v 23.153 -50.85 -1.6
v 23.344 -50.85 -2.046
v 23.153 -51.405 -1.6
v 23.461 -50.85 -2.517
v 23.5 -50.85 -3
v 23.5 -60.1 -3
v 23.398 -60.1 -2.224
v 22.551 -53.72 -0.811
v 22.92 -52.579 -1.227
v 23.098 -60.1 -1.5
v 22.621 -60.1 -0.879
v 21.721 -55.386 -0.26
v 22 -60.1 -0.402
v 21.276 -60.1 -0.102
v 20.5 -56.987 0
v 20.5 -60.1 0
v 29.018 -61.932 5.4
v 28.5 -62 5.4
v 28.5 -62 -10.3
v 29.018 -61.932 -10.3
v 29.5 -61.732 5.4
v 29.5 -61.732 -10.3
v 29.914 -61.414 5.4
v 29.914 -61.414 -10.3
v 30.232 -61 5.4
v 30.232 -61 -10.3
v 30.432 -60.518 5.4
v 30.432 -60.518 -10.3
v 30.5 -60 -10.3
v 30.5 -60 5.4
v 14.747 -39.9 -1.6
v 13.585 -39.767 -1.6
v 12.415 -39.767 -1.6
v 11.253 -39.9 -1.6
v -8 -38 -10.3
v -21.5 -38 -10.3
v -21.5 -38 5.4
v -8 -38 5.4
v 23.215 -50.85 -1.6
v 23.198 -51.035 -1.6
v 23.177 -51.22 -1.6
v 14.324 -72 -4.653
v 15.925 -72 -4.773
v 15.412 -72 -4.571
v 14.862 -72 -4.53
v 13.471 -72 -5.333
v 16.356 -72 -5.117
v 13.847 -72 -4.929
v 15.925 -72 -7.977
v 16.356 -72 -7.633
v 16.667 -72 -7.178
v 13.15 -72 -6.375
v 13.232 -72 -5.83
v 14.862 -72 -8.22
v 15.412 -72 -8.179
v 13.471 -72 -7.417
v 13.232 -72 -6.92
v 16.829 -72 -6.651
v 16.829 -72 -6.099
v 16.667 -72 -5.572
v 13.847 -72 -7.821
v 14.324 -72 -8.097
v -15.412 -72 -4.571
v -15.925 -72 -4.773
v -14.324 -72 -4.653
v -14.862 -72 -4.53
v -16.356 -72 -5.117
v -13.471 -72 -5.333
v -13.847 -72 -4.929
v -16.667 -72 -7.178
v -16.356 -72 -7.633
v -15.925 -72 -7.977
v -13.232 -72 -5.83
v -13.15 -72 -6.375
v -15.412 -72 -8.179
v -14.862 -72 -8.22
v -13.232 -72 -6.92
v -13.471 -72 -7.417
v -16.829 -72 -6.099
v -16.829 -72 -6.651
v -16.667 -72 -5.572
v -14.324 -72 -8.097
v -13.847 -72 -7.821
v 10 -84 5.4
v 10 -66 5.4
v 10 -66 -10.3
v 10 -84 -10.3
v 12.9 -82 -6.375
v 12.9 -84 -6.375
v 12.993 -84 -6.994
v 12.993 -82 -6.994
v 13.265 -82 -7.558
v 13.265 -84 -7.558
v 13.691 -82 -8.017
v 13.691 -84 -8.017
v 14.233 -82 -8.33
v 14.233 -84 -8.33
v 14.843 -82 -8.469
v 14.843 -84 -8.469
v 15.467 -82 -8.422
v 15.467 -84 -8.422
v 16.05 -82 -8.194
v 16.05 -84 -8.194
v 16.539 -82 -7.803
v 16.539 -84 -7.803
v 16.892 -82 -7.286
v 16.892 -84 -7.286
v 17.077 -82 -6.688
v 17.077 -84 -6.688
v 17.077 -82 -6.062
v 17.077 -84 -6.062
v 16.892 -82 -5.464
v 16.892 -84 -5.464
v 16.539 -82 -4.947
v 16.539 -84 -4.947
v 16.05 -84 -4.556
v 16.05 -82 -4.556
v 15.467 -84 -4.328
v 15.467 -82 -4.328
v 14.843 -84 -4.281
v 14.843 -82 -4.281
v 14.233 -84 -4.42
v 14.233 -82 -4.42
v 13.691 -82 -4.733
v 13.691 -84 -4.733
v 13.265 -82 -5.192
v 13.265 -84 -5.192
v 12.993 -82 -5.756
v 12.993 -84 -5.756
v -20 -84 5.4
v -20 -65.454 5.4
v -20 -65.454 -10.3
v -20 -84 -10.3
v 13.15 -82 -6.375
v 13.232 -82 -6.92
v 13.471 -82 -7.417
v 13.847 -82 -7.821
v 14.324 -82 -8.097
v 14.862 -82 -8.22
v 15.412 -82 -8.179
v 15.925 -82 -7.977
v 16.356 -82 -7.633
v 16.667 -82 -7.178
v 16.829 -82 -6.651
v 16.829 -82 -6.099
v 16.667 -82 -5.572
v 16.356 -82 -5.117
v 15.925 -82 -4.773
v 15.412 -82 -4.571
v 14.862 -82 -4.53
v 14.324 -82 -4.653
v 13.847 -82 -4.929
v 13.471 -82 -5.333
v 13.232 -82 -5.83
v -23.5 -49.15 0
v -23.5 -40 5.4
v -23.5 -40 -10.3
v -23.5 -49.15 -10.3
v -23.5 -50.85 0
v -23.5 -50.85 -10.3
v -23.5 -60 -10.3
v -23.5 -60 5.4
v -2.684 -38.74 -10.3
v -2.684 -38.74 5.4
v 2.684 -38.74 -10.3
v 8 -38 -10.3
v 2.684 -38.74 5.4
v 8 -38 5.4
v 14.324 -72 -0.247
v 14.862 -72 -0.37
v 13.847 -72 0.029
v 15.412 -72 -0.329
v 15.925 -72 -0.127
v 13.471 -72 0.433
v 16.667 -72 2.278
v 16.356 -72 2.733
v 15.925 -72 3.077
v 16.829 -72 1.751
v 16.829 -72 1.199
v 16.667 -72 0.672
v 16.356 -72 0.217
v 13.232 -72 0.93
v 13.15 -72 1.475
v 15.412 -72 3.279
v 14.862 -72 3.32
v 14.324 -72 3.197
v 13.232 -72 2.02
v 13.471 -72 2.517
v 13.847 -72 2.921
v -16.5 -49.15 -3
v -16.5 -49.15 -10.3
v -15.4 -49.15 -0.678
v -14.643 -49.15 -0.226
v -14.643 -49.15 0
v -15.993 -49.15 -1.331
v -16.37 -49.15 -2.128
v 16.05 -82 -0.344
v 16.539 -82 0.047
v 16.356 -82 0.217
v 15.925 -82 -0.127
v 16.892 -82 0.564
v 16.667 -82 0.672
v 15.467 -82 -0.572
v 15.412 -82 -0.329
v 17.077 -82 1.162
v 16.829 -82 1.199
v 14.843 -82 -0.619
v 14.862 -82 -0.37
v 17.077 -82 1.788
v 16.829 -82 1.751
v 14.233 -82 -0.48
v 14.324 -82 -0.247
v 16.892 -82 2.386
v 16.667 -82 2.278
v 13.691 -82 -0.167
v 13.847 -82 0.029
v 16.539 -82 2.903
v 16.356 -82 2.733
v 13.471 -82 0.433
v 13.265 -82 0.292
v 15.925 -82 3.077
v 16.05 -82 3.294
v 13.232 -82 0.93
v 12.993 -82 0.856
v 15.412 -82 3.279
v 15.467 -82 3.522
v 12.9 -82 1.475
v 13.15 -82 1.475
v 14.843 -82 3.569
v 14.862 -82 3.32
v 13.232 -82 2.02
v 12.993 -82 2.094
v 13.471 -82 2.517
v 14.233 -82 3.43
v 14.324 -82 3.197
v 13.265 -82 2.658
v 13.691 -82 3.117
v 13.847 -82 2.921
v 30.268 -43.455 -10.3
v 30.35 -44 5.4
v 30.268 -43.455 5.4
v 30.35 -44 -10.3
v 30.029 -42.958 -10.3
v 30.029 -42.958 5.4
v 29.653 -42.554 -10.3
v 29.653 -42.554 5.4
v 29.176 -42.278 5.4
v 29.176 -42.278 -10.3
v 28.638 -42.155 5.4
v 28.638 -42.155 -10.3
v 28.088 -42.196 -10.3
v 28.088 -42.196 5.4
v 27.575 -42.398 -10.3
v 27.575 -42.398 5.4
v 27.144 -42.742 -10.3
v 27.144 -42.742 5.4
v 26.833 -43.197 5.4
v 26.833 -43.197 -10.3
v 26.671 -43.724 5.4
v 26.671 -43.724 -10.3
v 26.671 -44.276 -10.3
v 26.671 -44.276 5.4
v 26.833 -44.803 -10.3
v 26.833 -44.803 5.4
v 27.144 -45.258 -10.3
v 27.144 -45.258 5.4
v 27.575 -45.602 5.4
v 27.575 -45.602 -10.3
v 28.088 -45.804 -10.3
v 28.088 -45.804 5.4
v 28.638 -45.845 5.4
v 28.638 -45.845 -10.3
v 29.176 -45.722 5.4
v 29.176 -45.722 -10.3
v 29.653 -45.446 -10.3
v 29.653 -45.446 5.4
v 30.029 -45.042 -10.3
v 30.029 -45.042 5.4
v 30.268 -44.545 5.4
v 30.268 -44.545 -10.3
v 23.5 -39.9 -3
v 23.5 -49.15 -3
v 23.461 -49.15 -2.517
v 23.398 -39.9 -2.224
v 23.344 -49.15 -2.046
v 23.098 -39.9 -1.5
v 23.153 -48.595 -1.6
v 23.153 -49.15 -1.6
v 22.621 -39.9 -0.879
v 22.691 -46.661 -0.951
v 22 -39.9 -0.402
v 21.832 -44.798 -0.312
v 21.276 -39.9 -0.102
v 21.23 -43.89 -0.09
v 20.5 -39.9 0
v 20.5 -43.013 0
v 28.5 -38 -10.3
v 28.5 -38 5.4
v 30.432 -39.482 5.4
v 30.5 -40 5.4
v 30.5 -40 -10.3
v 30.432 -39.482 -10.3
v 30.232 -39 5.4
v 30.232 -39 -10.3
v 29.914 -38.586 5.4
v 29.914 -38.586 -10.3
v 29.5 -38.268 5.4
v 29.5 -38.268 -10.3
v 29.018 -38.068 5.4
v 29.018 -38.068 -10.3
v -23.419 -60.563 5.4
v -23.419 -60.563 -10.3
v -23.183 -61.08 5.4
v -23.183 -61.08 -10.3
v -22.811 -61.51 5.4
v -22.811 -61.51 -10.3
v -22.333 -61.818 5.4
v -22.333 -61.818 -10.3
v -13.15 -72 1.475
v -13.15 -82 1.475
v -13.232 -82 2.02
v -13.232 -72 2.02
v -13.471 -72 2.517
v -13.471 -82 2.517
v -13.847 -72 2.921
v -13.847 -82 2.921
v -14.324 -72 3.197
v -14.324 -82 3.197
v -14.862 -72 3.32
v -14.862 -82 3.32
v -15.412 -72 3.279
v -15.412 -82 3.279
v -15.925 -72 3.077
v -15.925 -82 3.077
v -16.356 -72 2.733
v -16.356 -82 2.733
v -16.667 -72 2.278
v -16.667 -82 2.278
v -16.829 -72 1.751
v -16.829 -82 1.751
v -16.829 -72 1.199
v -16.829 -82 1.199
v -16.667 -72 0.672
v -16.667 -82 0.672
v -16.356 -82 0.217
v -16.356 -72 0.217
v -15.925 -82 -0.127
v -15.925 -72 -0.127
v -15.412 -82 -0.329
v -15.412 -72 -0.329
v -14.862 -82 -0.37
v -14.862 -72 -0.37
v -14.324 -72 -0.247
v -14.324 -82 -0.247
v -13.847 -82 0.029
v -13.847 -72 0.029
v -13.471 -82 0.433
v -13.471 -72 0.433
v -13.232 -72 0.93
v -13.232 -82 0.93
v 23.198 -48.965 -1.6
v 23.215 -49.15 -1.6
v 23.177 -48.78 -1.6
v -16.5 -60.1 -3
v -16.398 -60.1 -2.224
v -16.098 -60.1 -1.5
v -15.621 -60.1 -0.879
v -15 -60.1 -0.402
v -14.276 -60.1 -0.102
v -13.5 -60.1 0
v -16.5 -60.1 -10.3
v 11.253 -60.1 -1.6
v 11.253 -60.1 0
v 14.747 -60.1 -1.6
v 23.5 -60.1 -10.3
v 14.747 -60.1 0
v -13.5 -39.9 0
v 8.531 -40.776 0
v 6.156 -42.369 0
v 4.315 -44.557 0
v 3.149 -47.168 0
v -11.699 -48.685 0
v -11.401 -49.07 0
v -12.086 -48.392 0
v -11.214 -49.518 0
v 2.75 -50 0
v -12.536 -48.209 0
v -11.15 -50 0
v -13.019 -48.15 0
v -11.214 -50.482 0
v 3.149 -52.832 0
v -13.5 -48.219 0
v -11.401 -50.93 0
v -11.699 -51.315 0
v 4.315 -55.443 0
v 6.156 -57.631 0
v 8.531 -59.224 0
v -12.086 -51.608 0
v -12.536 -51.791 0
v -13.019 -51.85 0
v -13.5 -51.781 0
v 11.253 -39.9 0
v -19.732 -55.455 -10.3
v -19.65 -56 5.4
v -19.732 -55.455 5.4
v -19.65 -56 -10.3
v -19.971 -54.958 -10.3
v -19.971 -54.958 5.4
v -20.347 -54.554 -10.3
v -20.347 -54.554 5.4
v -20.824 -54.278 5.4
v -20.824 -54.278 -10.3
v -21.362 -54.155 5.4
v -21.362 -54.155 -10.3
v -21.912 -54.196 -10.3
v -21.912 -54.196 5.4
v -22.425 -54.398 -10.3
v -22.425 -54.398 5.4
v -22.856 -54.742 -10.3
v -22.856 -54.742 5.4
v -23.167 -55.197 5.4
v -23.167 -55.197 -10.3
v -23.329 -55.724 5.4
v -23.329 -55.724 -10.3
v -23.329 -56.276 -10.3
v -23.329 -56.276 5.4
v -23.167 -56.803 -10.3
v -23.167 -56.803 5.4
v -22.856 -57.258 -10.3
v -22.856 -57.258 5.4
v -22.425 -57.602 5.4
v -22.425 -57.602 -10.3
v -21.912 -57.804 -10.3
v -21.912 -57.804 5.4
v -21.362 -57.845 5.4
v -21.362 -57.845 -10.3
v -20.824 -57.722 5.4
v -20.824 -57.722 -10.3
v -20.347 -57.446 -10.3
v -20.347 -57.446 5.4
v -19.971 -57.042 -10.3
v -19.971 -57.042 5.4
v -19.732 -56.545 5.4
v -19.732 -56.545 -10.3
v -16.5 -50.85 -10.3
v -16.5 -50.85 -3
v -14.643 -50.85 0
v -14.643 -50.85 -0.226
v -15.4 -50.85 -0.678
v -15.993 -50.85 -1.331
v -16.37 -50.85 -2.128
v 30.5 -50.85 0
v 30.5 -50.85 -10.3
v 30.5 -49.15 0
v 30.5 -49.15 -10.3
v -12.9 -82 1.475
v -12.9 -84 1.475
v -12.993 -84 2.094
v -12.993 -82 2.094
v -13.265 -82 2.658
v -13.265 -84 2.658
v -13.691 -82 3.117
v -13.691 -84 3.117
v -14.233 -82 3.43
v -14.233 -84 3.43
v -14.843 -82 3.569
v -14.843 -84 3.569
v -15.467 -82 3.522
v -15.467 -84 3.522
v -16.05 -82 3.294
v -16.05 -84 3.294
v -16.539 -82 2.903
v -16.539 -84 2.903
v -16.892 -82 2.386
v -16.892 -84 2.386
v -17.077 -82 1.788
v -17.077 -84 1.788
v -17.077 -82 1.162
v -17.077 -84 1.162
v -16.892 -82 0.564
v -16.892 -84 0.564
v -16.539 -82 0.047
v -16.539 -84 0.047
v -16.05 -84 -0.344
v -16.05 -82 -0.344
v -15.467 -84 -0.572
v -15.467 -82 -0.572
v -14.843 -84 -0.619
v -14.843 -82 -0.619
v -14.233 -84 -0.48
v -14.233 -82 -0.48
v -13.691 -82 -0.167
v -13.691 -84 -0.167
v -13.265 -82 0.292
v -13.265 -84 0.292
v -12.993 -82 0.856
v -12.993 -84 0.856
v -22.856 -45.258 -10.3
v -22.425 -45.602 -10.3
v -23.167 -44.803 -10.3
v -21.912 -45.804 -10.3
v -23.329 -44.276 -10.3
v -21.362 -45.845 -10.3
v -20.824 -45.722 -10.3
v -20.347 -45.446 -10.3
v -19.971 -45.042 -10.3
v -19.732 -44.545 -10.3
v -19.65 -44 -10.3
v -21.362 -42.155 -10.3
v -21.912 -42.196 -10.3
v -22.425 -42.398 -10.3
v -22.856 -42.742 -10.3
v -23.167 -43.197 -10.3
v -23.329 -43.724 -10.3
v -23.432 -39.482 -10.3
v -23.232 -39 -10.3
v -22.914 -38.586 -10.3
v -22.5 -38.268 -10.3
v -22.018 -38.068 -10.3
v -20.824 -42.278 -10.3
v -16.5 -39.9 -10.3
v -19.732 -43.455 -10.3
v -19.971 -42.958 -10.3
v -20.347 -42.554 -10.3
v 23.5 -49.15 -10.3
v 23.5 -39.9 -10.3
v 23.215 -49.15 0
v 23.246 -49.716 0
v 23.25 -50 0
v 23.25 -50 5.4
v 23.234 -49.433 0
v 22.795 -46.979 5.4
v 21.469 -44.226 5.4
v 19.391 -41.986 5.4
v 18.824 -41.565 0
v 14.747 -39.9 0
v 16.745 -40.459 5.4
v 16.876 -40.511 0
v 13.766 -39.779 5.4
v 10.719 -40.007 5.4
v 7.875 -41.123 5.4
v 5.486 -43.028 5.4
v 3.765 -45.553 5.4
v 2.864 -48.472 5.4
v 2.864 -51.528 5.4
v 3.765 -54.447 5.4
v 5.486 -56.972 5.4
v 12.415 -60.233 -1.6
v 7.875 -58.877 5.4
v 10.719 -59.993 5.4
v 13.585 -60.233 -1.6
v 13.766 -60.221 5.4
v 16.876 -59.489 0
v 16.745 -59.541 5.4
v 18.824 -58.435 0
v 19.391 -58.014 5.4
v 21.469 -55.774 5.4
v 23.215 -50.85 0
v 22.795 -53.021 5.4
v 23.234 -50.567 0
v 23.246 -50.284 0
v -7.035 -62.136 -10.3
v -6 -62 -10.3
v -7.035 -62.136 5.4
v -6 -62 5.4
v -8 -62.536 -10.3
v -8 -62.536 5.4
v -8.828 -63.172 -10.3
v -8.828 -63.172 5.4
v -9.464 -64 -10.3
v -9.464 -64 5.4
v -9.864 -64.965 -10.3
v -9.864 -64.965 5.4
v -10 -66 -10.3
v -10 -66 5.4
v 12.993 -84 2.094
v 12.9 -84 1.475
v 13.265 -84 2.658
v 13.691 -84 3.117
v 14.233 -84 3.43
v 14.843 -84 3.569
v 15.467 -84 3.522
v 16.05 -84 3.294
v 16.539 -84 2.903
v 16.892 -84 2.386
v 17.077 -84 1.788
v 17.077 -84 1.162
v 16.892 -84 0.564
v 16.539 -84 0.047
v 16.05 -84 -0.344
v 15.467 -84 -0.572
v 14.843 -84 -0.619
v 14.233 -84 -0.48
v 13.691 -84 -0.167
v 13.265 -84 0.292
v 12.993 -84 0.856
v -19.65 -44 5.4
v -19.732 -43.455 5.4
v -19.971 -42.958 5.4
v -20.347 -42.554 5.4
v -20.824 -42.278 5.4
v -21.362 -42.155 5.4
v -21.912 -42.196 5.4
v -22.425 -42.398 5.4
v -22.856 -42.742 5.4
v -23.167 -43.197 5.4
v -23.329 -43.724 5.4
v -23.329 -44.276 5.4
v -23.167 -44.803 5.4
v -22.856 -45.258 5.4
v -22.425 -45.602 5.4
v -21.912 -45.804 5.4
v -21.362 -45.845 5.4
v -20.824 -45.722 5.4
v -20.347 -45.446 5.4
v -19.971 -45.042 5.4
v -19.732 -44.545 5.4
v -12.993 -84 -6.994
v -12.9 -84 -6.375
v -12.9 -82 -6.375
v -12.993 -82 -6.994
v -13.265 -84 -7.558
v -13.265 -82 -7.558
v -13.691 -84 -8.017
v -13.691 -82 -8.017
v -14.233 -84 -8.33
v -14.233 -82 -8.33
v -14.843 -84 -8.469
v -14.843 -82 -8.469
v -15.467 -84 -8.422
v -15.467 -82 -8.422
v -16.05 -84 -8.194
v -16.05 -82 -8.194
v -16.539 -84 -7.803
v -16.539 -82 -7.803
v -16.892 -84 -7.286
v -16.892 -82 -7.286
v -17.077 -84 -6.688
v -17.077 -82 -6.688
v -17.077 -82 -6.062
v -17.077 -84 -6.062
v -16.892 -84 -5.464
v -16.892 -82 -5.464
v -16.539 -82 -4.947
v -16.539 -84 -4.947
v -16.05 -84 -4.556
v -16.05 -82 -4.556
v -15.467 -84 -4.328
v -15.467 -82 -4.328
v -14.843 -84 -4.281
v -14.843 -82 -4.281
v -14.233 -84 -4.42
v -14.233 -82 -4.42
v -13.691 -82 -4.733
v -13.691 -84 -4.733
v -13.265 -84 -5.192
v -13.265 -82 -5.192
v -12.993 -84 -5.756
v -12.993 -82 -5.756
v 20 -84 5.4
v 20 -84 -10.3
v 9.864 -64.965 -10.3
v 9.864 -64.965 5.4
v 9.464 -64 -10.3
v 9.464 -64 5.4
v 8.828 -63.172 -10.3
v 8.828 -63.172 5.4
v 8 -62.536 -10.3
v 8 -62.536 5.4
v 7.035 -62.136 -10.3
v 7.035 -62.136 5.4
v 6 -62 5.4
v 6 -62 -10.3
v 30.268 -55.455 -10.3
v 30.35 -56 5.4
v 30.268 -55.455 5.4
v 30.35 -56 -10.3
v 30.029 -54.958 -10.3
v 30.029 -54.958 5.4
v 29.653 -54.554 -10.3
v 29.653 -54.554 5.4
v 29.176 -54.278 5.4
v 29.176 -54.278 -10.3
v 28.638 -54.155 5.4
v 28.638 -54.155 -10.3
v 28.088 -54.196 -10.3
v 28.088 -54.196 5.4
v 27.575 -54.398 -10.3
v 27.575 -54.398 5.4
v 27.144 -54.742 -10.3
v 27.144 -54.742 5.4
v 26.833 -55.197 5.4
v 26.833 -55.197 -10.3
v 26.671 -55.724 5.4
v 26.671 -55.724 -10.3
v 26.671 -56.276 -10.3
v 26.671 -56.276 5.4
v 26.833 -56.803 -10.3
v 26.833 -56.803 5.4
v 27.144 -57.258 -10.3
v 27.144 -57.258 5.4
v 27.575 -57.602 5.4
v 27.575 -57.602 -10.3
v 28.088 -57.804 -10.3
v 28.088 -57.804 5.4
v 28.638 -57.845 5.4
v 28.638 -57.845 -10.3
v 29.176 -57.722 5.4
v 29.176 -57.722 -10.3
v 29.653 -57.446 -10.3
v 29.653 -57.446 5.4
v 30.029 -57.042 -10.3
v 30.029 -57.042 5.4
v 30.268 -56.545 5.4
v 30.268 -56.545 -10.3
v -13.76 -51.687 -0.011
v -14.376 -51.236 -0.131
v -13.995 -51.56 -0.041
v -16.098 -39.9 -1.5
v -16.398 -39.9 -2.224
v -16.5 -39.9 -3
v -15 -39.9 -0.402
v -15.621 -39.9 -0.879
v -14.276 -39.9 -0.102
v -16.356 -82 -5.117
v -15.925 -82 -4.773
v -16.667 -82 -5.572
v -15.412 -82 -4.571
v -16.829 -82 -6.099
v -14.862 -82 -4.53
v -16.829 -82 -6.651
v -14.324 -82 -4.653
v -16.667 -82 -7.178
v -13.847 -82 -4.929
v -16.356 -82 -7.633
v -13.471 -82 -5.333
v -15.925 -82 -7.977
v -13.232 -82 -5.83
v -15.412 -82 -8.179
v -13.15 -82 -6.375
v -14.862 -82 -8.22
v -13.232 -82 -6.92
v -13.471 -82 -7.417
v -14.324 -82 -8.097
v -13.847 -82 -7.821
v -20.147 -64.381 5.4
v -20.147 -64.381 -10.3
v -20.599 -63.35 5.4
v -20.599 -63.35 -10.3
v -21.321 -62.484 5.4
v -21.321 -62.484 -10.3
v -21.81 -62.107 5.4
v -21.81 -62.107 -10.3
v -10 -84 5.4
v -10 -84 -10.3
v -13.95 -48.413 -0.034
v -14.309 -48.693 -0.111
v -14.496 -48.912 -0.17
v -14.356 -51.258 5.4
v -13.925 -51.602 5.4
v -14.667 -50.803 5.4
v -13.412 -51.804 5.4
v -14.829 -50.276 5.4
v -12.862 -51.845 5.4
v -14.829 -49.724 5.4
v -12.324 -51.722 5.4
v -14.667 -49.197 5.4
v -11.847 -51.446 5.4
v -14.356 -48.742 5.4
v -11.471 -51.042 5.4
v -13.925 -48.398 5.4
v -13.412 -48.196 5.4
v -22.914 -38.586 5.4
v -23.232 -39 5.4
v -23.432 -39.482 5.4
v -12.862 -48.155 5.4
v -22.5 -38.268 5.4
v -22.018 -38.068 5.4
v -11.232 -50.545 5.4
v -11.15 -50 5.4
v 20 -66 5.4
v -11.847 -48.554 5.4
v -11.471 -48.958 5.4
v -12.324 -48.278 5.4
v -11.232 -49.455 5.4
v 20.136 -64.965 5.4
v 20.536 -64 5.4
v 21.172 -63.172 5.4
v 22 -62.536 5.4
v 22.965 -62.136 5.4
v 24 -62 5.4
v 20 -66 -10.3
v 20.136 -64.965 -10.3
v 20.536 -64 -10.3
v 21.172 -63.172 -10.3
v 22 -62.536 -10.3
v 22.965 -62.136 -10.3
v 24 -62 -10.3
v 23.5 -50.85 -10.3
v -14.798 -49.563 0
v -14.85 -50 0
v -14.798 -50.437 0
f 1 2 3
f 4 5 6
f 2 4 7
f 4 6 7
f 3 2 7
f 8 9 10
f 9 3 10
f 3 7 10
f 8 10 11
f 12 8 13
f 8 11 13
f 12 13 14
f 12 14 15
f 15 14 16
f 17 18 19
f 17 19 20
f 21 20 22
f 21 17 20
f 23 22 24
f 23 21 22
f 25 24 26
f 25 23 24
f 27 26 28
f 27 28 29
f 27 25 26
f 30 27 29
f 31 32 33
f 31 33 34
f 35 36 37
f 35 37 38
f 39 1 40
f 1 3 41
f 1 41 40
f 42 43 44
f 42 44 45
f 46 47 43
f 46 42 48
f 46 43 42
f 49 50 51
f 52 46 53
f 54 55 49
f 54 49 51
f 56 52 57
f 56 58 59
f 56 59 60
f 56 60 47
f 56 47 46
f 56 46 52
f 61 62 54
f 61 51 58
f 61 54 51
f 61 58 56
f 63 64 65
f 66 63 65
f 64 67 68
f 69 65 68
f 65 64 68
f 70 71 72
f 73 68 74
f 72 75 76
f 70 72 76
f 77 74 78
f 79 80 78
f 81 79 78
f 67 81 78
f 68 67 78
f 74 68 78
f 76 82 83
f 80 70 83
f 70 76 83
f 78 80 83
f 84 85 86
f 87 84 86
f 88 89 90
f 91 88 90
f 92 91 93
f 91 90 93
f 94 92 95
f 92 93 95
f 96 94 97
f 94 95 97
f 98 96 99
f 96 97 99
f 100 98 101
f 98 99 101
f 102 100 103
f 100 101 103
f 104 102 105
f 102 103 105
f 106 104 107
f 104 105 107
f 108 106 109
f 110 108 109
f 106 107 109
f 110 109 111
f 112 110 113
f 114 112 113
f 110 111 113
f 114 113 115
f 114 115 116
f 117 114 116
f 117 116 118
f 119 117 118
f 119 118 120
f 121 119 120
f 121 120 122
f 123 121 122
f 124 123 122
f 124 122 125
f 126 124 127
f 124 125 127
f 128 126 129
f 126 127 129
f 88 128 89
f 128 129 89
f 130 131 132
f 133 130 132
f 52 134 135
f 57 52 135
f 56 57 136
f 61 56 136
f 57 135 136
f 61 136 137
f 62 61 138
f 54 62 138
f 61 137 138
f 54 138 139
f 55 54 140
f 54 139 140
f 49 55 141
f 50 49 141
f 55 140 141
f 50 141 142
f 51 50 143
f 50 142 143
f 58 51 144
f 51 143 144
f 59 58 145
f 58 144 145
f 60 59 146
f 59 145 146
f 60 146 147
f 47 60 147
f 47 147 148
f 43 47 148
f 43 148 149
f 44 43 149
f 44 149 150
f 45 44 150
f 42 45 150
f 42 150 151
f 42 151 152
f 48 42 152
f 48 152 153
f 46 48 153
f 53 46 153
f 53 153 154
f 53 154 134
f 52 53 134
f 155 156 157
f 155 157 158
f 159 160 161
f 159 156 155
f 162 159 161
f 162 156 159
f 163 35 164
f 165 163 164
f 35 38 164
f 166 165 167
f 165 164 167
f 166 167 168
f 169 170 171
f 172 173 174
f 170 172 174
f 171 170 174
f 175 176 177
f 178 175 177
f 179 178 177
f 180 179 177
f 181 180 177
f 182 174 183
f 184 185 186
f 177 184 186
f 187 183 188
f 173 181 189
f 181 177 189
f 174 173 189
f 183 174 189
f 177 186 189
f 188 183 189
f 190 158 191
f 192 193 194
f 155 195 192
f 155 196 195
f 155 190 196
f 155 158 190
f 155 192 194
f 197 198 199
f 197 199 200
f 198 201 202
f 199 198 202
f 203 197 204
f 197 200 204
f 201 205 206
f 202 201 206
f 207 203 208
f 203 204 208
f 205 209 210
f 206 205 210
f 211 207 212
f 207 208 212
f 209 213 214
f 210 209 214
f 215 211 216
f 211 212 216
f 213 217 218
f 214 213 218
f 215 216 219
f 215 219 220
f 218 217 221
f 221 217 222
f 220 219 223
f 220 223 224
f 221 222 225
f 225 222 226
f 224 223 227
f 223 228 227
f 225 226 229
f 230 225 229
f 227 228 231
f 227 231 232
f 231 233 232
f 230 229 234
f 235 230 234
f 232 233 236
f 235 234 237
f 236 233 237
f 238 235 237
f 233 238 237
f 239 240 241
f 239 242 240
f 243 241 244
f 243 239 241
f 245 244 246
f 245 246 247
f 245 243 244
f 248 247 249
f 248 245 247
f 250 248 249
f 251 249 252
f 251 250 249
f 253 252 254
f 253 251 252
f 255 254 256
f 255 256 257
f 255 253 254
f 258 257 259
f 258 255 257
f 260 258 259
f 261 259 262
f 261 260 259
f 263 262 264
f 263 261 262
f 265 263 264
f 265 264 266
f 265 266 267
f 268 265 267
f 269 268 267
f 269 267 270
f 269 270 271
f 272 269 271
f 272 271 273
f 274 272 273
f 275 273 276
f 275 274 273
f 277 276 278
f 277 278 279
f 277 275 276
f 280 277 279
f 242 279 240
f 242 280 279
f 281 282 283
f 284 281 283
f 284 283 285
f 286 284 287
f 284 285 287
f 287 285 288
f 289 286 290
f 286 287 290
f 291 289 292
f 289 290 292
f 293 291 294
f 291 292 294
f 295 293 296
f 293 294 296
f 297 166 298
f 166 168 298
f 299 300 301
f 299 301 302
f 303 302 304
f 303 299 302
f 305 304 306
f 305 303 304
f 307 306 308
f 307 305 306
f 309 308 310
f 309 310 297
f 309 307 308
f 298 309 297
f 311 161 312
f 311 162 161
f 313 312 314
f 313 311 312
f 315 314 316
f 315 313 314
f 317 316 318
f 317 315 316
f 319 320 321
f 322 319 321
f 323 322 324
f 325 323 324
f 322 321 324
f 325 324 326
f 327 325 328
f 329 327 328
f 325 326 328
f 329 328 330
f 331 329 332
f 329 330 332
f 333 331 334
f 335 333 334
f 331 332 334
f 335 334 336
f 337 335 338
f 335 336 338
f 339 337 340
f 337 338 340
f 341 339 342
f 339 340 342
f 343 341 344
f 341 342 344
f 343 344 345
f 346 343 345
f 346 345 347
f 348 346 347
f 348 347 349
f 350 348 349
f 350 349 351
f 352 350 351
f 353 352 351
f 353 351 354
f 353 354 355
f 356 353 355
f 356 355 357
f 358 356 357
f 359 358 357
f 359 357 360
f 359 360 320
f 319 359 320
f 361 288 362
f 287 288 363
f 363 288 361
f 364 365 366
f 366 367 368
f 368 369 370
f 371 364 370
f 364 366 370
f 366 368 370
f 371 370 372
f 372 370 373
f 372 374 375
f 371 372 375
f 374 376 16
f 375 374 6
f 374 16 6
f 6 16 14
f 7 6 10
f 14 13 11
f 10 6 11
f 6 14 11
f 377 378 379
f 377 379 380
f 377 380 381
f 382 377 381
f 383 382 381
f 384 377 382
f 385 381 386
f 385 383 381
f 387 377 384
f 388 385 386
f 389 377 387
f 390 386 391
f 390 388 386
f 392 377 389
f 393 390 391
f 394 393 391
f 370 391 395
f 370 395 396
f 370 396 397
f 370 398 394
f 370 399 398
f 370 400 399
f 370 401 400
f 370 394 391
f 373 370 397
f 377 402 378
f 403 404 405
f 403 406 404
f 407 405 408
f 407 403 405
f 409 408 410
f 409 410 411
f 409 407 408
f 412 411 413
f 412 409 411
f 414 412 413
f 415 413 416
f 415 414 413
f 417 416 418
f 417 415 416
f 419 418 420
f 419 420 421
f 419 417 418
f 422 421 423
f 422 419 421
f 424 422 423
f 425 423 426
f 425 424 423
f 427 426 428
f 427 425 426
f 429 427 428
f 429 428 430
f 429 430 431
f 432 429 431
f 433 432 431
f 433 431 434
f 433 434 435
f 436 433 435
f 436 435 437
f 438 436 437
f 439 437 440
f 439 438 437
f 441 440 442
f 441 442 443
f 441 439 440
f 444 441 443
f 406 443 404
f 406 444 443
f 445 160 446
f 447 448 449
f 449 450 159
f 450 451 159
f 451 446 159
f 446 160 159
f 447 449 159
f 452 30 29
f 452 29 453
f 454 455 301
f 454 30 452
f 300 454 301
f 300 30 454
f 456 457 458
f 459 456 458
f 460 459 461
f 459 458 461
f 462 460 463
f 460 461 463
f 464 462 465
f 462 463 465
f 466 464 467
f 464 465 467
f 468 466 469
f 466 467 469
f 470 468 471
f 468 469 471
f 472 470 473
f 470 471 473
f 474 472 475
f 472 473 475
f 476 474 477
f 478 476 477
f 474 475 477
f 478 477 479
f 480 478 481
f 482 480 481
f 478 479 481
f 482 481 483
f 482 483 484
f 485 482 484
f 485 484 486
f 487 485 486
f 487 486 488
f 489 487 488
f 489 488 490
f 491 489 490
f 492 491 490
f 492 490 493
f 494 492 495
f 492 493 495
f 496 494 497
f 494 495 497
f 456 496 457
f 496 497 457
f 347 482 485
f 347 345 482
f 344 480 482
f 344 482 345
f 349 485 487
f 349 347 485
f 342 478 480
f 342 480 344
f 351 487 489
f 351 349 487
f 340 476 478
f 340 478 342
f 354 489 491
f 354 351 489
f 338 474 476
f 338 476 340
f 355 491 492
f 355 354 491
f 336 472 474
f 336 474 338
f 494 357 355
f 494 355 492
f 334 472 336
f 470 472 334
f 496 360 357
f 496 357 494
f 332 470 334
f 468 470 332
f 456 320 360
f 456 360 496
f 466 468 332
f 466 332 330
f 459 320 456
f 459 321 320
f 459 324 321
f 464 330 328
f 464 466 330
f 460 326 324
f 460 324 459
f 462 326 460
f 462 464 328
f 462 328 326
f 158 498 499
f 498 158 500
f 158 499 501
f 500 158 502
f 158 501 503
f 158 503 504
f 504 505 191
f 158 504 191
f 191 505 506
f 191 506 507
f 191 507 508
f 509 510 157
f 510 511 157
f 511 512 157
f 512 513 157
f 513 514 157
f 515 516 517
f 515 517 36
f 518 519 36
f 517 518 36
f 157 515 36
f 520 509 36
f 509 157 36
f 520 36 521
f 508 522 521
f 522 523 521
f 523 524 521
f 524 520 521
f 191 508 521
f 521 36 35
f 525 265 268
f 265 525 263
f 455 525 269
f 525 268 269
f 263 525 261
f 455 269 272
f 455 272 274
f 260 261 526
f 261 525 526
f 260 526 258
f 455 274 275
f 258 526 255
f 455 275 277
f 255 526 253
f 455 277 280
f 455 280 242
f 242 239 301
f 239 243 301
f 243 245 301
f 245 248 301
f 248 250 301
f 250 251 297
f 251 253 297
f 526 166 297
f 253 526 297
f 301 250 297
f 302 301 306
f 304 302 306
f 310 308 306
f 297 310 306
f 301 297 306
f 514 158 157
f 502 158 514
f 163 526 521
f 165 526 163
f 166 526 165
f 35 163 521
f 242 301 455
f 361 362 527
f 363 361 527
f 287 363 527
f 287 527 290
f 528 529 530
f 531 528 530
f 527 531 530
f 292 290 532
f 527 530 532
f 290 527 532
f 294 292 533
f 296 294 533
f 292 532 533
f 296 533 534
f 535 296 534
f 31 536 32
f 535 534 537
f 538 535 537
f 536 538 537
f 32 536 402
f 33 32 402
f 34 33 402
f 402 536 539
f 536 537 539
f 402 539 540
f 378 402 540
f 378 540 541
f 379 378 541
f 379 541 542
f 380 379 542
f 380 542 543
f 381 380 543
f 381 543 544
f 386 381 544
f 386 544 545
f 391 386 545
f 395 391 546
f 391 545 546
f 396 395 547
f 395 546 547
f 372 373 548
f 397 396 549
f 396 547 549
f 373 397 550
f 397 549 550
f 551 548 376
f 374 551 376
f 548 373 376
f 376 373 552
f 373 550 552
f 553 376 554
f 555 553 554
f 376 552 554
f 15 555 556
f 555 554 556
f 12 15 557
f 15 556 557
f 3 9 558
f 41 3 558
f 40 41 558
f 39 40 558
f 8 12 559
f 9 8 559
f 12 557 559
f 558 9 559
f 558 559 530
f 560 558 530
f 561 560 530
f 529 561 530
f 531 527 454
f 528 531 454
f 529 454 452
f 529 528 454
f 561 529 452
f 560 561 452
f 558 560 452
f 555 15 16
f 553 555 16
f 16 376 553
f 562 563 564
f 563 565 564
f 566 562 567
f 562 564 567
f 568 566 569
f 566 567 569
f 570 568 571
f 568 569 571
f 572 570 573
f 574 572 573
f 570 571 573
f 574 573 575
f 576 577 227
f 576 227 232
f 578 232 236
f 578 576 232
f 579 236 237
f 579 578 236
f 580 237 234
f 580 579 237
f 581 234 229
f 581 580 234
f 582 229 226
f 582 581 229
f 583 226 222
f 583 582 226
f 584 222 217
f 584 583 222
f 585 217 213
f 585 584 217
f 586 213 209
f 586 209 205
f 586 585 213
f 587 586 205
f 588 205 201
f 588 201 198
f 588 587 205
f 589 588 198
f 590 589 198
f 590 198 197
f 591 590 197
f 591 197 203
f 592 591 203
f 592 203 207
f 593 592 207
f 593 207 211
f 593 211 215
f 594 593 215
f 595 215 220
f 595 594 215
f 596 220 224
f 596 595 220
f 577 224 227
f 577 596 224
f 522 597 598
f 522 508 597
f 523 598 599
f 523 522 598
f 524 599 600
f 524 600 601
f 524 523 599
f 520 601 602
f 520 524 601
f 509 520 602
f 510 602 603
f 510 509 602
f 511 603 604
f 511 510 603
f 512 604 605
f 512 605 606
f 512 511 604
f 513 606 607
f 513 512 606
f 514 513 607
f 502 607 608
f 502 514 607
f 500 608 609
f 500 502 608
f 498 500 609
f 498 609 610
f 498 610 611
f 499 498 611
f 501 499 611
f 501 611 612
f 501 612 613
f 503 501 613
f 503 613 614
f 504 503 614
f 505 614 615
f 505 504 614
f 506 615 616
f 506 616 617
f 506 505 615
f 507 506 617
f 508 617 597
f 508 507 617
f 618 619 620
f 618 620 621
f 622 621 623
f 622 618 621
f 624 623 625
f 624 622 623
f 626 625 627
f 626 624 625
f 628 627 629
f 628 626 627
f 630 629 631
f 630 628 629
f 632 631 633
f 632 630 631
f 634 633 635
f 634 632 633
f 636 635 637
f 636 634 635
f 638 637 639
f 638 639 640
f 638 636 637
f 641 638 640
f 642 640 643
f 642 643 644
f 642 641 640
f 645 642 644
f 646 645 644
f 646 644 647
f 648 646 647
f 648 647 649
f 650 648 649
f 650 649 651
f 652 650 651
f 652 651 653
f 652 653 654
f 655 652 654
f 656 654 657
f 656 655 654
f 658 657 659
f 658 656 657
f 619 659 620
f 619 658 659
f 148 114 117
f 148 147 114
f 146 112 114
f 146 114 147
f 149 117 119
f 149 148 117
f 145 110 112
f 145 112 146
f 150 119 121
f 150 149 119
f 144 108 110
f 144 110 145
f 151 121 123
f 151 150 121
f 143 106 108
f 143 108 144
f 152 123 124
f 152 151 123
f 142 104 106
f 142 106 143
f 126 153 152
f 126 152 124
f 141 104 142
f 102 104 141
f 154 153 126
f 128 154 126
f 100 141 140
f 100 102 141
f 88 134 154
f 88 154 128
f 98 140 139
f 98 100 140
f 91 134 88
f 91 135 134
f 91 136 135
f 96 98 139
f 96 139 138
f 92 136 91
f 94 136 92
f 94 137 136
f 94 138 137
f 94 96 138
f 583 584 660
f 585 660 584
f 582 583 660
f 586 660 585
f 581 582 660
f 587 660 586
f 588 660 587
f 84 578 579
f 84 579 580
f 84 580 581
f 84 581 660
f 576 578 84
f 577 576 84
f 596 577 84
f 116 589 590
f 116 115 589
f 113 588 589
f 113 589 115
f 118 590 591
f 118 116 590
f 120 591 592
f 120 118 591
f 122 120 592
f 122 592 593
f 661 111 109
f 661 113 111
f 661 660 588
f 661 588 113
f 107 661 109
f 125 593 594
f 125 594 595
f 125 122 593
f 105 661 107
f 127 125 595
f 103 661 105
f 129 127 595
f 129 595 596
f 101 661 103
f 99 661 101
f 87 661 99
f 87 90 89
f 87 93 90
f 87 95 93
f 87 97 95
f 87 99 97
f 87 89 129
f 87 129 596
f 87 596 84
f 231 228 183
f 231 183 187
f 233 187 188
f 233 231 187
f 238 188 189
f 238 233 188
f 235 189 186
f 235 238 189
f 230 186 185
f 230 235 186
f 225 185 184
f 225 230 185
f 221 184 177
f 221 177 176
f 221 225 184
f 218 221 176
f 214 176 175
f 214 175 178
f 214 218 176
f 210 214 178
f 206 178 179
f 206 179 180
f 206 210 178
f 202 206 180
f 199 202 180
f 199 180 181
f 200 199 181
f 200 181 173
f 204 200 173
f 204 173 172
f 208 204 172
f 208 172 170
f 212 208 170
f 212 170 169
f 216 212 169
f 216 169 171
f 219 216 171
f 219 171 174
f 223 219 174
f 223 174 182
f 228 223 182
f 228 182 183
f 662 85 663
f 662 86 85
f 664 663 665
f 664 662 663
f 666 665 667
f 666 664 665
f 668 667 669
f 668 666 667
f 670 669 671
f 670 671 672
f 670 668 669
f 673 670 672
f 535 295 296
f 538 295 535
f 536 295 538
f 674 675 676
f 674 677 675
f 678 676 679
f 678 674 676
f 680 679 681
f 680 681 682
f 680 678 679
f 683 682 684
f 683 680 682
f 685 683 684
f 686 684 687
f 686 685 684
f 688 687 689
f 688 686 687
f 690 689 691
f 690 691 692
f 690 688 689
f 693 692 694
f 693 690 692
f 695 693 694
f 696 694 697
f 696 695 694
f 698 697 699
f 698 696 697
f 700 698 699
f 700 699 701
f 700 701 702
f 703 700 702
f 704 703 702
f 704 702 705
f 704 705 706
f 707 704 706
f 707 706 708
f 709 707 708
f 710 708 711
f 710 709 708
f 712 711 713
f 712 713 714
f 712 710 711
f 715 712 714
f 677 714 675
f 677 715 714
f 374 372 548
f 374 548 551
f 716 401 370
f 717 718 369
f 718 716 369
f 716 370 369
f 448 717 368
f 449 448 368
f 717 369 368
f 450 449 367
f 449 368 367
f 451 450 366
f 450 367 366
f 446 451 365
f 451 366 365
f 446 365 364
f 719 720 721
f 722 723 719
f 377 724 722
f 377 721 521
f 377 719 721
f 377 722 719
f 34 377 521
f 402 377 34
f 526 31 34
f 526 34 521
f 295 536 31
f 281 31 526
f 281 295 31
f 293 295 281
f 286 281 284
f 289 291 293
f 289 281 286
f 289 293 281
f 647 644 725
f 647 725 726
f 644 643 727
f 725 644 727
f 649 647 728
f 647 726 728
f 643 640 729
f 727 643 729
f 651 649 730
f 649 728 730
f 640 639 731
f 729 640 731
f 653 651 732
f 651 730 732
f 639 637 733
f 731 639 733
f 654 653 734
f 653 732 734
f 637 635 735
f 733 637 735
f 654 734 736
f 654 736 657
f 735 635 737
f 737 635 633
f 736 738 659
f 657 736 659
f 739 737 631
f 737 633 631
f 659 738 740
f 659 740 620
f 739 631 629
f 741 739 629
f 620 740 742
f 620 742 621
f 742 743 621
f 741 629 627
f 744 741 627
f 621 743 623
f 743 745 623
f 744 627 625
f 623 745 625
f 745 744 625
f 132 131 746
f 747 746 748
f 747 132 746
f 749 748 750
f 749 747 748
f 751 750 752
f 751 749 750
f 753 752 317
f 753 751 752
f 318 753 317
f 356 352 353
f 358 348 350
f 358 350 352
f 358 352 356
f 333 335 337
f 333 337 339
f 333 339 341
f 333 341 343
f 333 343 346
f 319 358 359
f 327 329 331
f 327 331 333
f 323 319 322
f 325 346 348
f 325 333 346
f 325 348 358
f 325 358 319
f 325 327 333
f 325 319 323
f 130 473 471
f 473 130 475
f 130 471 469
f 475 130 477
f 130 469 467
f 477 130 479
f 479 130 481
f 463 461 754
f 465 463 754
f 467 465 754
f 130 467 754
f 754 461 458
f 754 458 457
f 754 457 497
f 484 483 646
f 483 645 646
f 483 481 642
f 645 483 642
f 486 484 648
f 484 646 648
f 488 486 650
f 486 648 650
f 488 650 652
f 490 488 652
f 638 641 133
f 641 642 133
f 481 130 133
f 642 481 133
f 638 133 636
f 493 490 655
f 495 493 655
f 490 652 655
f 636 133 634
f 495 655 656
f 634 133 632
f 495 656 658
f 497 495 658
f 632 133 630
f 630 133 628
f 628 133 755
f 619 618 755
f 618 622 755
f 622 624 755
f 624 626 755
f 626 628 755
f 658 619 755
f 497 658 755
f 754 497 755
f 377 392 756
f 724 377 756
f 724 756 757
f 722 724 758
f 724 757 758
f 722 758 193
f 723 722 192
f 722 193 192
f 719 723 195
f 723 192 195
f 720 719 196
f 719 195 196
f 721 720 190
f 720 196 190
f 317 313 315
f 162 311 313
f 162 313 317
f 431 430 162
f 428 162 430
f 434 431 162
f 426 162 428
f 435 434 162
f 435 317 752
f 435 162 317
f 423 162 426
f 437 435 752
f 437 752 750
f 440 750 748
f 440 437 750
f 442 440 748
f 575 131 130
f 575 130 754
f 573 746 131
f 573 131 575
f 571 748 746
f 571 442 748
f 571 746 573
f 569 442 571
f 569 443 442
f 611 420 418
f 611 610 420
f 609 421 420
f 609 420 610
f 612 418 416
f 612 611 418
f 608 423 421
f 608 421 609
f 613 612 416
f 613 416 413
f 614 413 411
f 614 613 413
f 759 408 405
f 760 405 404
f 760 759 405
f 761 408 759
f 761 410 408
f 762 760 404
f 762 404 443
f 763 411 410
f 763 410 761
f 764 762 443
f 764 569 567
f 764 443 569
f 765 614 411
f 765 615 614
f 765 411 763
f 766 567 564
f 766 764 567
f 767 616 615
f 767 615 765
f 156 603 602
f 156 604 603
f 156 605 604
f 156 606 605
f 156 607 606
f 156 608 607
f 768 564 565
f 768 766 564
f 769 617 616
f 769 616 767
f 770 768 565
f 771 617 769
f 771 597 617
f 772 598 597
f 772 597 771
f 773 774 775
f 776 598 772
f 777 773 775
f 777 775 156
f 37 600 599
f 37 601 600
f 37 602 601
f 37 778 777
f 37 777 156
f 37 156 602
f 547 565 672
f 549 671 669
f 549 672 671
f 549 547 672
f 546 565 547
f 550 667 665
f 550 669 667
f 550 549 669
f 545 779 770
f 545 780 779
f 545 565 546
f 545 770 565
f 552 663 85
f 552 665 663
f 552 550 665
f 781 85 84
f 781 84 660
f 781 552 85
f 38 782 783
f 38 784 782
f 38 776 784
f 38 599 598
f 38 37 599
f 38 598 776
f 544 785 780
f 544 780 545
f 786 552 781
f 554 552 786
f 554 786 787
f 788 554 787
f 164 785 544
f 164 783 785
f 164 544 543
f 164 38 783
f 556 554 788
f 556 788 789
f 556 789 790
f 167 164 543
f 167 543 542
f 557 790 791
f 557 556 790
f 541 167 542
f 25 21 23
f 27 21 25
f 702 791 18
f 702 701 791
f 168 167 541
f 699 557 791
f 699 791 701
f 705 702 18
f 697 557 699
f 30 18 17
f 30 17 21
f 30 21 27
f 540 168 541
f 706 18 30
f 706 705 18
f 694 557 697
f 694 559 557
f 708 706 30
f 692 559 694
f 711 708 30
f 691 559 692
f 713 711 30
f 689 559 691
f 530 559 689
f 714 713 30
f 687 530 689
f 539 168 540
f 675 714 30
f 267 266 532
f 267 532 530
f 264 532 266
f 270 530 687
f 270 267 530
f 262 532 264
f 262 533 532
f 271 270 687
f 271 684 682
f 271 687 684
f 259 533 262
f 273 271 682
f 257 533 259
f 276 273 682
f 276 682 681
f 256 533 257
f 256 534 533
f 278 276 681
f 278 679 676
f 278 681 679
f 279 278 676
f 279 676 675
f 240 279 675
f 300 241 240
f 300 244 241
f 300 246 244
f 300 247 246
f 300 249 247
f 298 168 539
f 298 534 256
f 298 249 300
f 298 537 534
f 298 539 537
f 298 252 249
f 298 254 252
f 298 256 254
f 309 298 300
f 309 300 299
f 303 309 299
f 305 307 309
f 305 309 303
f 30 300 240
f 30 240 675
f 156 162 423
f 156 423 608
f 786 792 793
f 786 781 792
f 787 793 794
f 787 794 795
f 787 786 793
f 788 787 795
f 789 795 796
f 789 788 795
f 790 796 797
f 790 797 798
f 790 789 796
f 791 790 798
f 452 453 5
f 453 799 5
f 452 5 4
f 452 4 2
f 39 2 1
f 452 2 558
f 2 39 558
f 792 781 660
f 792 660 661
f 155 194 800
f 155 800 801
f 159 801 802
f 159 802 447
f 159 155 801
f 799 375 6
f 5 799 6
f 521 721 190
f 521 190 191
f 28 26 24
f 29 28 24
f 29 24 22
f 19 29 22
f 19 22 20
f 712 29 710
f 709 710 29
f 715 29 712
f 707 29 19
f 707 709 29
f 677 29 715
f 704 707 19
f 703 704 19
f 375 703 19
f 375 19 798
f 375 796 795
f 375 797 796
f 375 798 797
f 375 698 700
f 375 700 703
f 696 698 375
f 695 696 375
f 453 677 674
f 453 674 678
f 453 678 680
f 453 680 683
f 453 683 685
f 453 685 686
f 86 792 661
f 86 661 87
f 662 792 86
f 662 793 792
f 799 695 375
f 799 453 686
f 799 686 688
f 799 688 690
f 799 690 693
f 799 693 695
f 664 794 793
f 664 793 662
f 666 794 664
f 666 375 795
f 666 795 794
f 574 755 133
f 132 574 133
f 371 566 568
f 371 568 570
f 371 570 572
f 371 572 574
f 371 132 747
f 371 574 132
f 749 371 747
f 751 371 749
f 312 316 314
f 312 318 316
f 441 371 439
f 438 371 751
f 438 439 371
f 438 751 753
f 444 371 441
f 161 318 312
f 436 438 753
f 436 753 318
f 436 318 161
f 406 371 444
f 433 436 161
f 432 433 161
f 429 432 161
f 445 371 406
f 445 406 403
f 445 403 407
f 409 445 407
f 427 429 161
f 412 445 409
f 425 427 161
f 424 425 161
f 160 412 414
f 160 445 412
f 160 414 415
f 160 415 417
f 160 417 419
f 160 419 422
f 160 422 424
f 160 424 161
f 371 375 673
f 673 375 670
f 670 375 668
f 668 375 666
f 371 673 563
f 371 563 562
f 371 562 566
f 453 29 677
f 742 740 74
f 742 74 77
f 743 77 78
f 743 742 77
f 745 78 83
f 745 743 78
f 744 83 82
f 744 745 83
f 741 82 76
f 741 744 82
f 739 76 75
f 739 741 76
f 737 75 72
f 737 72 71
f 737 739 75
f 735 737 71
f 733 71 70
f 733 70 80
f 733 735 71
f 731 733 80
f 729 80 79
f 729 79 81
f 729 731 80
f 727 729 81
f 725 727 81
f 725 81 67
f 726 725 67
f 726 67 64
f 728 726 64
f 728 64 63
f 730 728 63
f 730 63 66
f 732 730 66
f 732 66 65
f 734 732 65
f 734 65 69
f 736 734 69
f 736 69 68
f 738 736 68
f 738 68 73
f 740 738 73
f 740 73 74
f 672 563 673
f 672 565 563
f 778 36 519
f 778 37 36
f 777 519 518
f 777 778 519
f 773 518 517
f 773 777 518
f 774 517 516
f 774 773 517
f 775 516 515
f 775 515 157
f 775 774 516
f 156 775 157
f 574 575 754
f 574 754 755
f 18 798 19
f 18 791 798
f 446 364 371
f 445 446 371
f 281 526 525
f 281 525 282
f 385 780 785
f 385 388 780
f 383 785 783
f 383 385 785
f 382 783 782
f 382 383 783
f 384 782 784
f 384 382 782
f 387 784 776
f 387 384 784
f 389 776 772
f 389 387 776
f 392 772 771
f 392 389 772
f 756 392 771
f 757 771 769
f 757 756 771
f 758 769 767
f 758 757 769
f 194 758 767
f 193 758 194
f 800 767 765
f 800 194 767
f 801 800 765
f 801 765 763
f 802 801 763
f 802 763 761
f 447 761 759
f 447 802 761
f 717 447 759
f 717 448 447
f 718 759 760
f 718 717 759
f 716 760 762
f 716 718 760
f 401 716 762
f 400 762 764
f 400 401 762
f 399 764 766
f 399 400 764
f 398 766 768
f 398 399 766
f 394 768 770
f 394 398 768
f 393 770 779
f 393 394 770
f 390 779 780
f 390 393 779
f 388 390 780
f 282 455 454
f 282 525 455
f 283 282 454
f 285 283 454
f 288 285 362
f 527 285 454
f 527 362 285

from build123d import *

# Parameters (mm, degrees)
SKETCH035_R                   = 7
SKETCH035_R_2                 = 1.85
PAD021_DEPTH                  = 5.4
PAD021_DEPTH_BACK             = 10.3
POCKET019_DEPTH               = 10.1
SKETCH039_W                   = 1.7
SKETCH039_H                   = 20
POCKET020_DEPTH               = 54.001
SKETCH043_R                   = 10.25
POCKET023_DEPTH               = 7
SKETCH044_W                   = 10
SKETCH044_H                   = 7.85
PAD025_DEPTH                  = 22
SKETCH045_R                   = 1.85
POCKET024_DEPTH               = 12
SKETCH046_R                   = 2.1
POCKET025_DEPTH               = 2
SKETCH044_MIRRORED002_2_W     = 10
SKETCH044_MIRRORED002_2_H     = 7.85
PAD025_MIRRORED002_2_DEPTH    = 22
SKETCH045_MIRRORED002_2_R     = 1.85
POCKET024_MIRRORED002_2_DEPTH = 12
SKETCH046_MIRRORED002_2_R     = 2.1
POCKET025_MIRRORED002_2_DEPTH = 2
FILLET009_R                   = 4


with BuildPart() as part:
    # Sketch035 → Pad021 (new body, two sides)
    with BuildSketch(Plane.XY) as pad021_sk:
        with BuildLine():
            Line((-23.5, 10), (-23.5, -10))
            ThreePointArc((-23.5, -10), (-22.914214, -11.414214), (-21.5, -12))
            Line((-21.5, -12), (28.5, -12))
            ThreePointArc((28.5, -12), (29.914214, -11.414214), (30.5, -10))
            Line((30.5, -10), (30.5, 10))
            ThreePointArc((30.5, 10), (29.914214, 11.414214), (28.5, 12))
            Line((8, 12), (28.5, 12))
            ThreePointArc((-8, 12), (0, 11.167024), (8, 12))
            Line((-21.5, 12), (-8, 12))
            ThreePointArc((-21.5, 12), (-22.914214, 11.414214), (-23.5, 10))
        make_face()
        with Locations((13, 0)):
            Circle(SKETCH035_R, mode=Mode.SUBTRACT)
        with Locations((-21.5, 6)):
            Circle(SKETCH035_R_2, mode=Mode.SUBTRACT)
        with Locations((-21.5, -6)):
            Circle(SKETCH035_R_2, mode=Mode.SUBTRACT)
        with Locations((28.5, 6)):
            Circle(SKETCH035_R_2, mode=Mode.SUBTRACT)
        with Locations((28.5, -6)):
            Circle(SKETCH035_R_2, mode=Mode.SUBTRACT)
        with Locations((-13, 0)):
            Circle(SKETCH035_R_2, mode=Mode.SUBTRACT)
    extrude(amount=PAD021_DEPTH)
    extrude(pad021_sk.sketch, amount=-PAD021_DEPTH_BACK)

    # Sketch038 → Pocket019 (cut, symmetric)
    with BuildSketch(Plane.XZ):
        with BuildLine():
            Line((-16.5, -3), (-16.5, -20))
            Line((-16.5, -20), (23.5, -20))
            Line((23.5, -20), (23.5, -3))
            ThreePointArc((23.5, -3), (22.62132, -0.87868), (20.5, 0))
            Line((20.5, 0), (-13.5, 0))
            ThreePointArc((-13.5, 0), (-15.62132, -0.87868), (-16.5, -3))
        make_face()
    extrude(amount=POCKET019_DEPTH, both=True, mode=Mode.SUBTRACT)

    # Sketch039 (on Face3 of Pocket019) → Pocket020 (cut, through all)
    with BuildSketch(Plane(origin=(-23.5, 0, 0), x_dir=(0, -1, 0), z_dir=(-1, 0, 0))):
        with Locations((0, -10)):
            Rectangle(SKETCH039_W, SKETCH039_H)
    extrude(amount=-POCKET020_DEPTH, mode=Mode.SUBTRACT)

    # Sketch043 (on Face5 of Pocket020) → Pocket023 (cut)
    with BuildSketch(Plane.XY.offset(5.4)):
        with Locations((13, 0)):
            Circle(SKETCH043_R)
    extrude(amount=-POCKET023_DEPTH, mode=Mode.SUBTRACT)

    # Sketch044 → Pad025 (join)
    with BuildSketch(Plane(origin=(0, -12, -2.45), x_dir=(1, 0, 0), z_dir=(0, -1, 0))):
        with Locations((-15, 3.925)):
            Rectangle(SKETCH044_W, SKETCH044_H)
    pad025 = extrude(amount=PAD025_DEPTH)

    # Sketch045 (on Face43 of Pad025) → Pocket024 (cut)
    with BuildSketch(Plane.XZ.offset(34)):
        with Locations((-15, 1.475)):
            Circle(SKETCH045_R)
    pocket024 = extrude(amount=-POCKET024_DEPTH, mode=Mode.SUBTRACT)

    # Sketch046 (on Face43 of Pocket024) → Pocket025 (cut)
    with BuildSketch(Plane.XZ.offset(34)):
        with Locations((-15, 1.475)):
            Circle(SKETCH046_R)
    pocket025 = extrude(amount=-POCKET025_DEPTH, mode=Mode.SUBTRACT)

    # Sketch044 Mirrored002 2 → Pad025 Mirrored002 2 (add)
    with BuildSketch(Plane(origin=(0, -12, -2.45), x_dir=(-1, 0, 0), z_dir=(0, 1, 0))):
        with Locations((-15, 3.925)):
            Rectangle(SKETCH044_MIRRORED002_2_W, SKETCH044_MIRRORED002_2_H)
    pad025_mirrored002_2 = extrude(amount=-PAD025_MIRRORED002_2_DEPTH)

    # Sketch045 Mirrored002 2 → Pocket024 Mirrored002 2 (cut)
    with BuildSketch(Plane(origin=(0, -34, 0), x_dir=(-1, 0, 0), z_dir=(0, 1, 0))):
        with Locations((-15, 1.475)):
            Circle(SKETCH045_MIRRORED002_2_R)
    pocket024_mirrored002_2 = extrude(amount=POCKET024_MIRRORED002_2_DEPTH, mode=Mode.SUBTRACT)

    # Sketch046 Mirrored002 2 → Pocket025 Mirrored002 2 (cut)
    with BuildSketch(Plane(origin=(0, -34, 0), x_dir=(-1, 0, 0), z_dir=(0, 1, 0))):
        with Locations((-15, 1.475)):
            Circle(SKETCH046_MIRRORED002_2_R)
    pocket025_mirrored002_2 = extrude(amount=POCKET025_MIRRORED002_2_DEPTH, mode=Mode.SUBTRACT)

    # Mirrored003: Pad025, Pocket024, Pocket025, Pad025 Mirrored002 2, Pocket024 Mirrored002 2, Pocket025 Mirrored002 2 across Sketch044 H_Axis
    add(pad025.mirror(Plane(origin=(0, -12, -2.45), x_dir=(0, -1, 0), z_dir=(0, 0, 1))))
    add(pocket024.mirror(Plane(origin=(0, -12, -2.45), x_dir=(0, -1, 0), z_dir=(0, 0, 1))), mode=Mode.SUBTRACT)
    add(pocket025.mirror(Plane(origin=(0, -12, -2.45), x_dir=(0, -1, 0), z_dir=(0, 0, 1))), mode=Mode.SUBTRACT)
    add(pad025_mirrored002_2.mirror(Plane(origin=(0, -12, -2.45), x_dir=(0, -1, 0), z_dir=(0, 0, 1))))
    add(pocket024_mirrored002_2.mirror(Plane(origin=(0, -12, -2.45), x_dir=(0, -1, 0), z_dir=(0, 0, 1))), mode=Mode.SUBTRACT)
    add(pocket025_mirrored002_2.mirror(Plane(origin=(0, -12, -2.45), x_dir=(0, -1, 0), z_dir=(0, 0, 1))), mode=Mode.SUBTRACT)

    # Fillet009
    fillet009_edges = [part.edges().sort_by_distance(p)[0] for p in [
        (-20, -12, -2.45),
        (-10, -12, -2.45),
        (10, -12, -2.45),
        (20, -12, -2.45),
    ]]
    fillet(fillet009_edges, radius=FILLET009_R)


with BuildPart() as part_1:
    # Body009 placement: moved
    add(part.part.moved(Location((0, -50, 0))))


solid = part_1.part
